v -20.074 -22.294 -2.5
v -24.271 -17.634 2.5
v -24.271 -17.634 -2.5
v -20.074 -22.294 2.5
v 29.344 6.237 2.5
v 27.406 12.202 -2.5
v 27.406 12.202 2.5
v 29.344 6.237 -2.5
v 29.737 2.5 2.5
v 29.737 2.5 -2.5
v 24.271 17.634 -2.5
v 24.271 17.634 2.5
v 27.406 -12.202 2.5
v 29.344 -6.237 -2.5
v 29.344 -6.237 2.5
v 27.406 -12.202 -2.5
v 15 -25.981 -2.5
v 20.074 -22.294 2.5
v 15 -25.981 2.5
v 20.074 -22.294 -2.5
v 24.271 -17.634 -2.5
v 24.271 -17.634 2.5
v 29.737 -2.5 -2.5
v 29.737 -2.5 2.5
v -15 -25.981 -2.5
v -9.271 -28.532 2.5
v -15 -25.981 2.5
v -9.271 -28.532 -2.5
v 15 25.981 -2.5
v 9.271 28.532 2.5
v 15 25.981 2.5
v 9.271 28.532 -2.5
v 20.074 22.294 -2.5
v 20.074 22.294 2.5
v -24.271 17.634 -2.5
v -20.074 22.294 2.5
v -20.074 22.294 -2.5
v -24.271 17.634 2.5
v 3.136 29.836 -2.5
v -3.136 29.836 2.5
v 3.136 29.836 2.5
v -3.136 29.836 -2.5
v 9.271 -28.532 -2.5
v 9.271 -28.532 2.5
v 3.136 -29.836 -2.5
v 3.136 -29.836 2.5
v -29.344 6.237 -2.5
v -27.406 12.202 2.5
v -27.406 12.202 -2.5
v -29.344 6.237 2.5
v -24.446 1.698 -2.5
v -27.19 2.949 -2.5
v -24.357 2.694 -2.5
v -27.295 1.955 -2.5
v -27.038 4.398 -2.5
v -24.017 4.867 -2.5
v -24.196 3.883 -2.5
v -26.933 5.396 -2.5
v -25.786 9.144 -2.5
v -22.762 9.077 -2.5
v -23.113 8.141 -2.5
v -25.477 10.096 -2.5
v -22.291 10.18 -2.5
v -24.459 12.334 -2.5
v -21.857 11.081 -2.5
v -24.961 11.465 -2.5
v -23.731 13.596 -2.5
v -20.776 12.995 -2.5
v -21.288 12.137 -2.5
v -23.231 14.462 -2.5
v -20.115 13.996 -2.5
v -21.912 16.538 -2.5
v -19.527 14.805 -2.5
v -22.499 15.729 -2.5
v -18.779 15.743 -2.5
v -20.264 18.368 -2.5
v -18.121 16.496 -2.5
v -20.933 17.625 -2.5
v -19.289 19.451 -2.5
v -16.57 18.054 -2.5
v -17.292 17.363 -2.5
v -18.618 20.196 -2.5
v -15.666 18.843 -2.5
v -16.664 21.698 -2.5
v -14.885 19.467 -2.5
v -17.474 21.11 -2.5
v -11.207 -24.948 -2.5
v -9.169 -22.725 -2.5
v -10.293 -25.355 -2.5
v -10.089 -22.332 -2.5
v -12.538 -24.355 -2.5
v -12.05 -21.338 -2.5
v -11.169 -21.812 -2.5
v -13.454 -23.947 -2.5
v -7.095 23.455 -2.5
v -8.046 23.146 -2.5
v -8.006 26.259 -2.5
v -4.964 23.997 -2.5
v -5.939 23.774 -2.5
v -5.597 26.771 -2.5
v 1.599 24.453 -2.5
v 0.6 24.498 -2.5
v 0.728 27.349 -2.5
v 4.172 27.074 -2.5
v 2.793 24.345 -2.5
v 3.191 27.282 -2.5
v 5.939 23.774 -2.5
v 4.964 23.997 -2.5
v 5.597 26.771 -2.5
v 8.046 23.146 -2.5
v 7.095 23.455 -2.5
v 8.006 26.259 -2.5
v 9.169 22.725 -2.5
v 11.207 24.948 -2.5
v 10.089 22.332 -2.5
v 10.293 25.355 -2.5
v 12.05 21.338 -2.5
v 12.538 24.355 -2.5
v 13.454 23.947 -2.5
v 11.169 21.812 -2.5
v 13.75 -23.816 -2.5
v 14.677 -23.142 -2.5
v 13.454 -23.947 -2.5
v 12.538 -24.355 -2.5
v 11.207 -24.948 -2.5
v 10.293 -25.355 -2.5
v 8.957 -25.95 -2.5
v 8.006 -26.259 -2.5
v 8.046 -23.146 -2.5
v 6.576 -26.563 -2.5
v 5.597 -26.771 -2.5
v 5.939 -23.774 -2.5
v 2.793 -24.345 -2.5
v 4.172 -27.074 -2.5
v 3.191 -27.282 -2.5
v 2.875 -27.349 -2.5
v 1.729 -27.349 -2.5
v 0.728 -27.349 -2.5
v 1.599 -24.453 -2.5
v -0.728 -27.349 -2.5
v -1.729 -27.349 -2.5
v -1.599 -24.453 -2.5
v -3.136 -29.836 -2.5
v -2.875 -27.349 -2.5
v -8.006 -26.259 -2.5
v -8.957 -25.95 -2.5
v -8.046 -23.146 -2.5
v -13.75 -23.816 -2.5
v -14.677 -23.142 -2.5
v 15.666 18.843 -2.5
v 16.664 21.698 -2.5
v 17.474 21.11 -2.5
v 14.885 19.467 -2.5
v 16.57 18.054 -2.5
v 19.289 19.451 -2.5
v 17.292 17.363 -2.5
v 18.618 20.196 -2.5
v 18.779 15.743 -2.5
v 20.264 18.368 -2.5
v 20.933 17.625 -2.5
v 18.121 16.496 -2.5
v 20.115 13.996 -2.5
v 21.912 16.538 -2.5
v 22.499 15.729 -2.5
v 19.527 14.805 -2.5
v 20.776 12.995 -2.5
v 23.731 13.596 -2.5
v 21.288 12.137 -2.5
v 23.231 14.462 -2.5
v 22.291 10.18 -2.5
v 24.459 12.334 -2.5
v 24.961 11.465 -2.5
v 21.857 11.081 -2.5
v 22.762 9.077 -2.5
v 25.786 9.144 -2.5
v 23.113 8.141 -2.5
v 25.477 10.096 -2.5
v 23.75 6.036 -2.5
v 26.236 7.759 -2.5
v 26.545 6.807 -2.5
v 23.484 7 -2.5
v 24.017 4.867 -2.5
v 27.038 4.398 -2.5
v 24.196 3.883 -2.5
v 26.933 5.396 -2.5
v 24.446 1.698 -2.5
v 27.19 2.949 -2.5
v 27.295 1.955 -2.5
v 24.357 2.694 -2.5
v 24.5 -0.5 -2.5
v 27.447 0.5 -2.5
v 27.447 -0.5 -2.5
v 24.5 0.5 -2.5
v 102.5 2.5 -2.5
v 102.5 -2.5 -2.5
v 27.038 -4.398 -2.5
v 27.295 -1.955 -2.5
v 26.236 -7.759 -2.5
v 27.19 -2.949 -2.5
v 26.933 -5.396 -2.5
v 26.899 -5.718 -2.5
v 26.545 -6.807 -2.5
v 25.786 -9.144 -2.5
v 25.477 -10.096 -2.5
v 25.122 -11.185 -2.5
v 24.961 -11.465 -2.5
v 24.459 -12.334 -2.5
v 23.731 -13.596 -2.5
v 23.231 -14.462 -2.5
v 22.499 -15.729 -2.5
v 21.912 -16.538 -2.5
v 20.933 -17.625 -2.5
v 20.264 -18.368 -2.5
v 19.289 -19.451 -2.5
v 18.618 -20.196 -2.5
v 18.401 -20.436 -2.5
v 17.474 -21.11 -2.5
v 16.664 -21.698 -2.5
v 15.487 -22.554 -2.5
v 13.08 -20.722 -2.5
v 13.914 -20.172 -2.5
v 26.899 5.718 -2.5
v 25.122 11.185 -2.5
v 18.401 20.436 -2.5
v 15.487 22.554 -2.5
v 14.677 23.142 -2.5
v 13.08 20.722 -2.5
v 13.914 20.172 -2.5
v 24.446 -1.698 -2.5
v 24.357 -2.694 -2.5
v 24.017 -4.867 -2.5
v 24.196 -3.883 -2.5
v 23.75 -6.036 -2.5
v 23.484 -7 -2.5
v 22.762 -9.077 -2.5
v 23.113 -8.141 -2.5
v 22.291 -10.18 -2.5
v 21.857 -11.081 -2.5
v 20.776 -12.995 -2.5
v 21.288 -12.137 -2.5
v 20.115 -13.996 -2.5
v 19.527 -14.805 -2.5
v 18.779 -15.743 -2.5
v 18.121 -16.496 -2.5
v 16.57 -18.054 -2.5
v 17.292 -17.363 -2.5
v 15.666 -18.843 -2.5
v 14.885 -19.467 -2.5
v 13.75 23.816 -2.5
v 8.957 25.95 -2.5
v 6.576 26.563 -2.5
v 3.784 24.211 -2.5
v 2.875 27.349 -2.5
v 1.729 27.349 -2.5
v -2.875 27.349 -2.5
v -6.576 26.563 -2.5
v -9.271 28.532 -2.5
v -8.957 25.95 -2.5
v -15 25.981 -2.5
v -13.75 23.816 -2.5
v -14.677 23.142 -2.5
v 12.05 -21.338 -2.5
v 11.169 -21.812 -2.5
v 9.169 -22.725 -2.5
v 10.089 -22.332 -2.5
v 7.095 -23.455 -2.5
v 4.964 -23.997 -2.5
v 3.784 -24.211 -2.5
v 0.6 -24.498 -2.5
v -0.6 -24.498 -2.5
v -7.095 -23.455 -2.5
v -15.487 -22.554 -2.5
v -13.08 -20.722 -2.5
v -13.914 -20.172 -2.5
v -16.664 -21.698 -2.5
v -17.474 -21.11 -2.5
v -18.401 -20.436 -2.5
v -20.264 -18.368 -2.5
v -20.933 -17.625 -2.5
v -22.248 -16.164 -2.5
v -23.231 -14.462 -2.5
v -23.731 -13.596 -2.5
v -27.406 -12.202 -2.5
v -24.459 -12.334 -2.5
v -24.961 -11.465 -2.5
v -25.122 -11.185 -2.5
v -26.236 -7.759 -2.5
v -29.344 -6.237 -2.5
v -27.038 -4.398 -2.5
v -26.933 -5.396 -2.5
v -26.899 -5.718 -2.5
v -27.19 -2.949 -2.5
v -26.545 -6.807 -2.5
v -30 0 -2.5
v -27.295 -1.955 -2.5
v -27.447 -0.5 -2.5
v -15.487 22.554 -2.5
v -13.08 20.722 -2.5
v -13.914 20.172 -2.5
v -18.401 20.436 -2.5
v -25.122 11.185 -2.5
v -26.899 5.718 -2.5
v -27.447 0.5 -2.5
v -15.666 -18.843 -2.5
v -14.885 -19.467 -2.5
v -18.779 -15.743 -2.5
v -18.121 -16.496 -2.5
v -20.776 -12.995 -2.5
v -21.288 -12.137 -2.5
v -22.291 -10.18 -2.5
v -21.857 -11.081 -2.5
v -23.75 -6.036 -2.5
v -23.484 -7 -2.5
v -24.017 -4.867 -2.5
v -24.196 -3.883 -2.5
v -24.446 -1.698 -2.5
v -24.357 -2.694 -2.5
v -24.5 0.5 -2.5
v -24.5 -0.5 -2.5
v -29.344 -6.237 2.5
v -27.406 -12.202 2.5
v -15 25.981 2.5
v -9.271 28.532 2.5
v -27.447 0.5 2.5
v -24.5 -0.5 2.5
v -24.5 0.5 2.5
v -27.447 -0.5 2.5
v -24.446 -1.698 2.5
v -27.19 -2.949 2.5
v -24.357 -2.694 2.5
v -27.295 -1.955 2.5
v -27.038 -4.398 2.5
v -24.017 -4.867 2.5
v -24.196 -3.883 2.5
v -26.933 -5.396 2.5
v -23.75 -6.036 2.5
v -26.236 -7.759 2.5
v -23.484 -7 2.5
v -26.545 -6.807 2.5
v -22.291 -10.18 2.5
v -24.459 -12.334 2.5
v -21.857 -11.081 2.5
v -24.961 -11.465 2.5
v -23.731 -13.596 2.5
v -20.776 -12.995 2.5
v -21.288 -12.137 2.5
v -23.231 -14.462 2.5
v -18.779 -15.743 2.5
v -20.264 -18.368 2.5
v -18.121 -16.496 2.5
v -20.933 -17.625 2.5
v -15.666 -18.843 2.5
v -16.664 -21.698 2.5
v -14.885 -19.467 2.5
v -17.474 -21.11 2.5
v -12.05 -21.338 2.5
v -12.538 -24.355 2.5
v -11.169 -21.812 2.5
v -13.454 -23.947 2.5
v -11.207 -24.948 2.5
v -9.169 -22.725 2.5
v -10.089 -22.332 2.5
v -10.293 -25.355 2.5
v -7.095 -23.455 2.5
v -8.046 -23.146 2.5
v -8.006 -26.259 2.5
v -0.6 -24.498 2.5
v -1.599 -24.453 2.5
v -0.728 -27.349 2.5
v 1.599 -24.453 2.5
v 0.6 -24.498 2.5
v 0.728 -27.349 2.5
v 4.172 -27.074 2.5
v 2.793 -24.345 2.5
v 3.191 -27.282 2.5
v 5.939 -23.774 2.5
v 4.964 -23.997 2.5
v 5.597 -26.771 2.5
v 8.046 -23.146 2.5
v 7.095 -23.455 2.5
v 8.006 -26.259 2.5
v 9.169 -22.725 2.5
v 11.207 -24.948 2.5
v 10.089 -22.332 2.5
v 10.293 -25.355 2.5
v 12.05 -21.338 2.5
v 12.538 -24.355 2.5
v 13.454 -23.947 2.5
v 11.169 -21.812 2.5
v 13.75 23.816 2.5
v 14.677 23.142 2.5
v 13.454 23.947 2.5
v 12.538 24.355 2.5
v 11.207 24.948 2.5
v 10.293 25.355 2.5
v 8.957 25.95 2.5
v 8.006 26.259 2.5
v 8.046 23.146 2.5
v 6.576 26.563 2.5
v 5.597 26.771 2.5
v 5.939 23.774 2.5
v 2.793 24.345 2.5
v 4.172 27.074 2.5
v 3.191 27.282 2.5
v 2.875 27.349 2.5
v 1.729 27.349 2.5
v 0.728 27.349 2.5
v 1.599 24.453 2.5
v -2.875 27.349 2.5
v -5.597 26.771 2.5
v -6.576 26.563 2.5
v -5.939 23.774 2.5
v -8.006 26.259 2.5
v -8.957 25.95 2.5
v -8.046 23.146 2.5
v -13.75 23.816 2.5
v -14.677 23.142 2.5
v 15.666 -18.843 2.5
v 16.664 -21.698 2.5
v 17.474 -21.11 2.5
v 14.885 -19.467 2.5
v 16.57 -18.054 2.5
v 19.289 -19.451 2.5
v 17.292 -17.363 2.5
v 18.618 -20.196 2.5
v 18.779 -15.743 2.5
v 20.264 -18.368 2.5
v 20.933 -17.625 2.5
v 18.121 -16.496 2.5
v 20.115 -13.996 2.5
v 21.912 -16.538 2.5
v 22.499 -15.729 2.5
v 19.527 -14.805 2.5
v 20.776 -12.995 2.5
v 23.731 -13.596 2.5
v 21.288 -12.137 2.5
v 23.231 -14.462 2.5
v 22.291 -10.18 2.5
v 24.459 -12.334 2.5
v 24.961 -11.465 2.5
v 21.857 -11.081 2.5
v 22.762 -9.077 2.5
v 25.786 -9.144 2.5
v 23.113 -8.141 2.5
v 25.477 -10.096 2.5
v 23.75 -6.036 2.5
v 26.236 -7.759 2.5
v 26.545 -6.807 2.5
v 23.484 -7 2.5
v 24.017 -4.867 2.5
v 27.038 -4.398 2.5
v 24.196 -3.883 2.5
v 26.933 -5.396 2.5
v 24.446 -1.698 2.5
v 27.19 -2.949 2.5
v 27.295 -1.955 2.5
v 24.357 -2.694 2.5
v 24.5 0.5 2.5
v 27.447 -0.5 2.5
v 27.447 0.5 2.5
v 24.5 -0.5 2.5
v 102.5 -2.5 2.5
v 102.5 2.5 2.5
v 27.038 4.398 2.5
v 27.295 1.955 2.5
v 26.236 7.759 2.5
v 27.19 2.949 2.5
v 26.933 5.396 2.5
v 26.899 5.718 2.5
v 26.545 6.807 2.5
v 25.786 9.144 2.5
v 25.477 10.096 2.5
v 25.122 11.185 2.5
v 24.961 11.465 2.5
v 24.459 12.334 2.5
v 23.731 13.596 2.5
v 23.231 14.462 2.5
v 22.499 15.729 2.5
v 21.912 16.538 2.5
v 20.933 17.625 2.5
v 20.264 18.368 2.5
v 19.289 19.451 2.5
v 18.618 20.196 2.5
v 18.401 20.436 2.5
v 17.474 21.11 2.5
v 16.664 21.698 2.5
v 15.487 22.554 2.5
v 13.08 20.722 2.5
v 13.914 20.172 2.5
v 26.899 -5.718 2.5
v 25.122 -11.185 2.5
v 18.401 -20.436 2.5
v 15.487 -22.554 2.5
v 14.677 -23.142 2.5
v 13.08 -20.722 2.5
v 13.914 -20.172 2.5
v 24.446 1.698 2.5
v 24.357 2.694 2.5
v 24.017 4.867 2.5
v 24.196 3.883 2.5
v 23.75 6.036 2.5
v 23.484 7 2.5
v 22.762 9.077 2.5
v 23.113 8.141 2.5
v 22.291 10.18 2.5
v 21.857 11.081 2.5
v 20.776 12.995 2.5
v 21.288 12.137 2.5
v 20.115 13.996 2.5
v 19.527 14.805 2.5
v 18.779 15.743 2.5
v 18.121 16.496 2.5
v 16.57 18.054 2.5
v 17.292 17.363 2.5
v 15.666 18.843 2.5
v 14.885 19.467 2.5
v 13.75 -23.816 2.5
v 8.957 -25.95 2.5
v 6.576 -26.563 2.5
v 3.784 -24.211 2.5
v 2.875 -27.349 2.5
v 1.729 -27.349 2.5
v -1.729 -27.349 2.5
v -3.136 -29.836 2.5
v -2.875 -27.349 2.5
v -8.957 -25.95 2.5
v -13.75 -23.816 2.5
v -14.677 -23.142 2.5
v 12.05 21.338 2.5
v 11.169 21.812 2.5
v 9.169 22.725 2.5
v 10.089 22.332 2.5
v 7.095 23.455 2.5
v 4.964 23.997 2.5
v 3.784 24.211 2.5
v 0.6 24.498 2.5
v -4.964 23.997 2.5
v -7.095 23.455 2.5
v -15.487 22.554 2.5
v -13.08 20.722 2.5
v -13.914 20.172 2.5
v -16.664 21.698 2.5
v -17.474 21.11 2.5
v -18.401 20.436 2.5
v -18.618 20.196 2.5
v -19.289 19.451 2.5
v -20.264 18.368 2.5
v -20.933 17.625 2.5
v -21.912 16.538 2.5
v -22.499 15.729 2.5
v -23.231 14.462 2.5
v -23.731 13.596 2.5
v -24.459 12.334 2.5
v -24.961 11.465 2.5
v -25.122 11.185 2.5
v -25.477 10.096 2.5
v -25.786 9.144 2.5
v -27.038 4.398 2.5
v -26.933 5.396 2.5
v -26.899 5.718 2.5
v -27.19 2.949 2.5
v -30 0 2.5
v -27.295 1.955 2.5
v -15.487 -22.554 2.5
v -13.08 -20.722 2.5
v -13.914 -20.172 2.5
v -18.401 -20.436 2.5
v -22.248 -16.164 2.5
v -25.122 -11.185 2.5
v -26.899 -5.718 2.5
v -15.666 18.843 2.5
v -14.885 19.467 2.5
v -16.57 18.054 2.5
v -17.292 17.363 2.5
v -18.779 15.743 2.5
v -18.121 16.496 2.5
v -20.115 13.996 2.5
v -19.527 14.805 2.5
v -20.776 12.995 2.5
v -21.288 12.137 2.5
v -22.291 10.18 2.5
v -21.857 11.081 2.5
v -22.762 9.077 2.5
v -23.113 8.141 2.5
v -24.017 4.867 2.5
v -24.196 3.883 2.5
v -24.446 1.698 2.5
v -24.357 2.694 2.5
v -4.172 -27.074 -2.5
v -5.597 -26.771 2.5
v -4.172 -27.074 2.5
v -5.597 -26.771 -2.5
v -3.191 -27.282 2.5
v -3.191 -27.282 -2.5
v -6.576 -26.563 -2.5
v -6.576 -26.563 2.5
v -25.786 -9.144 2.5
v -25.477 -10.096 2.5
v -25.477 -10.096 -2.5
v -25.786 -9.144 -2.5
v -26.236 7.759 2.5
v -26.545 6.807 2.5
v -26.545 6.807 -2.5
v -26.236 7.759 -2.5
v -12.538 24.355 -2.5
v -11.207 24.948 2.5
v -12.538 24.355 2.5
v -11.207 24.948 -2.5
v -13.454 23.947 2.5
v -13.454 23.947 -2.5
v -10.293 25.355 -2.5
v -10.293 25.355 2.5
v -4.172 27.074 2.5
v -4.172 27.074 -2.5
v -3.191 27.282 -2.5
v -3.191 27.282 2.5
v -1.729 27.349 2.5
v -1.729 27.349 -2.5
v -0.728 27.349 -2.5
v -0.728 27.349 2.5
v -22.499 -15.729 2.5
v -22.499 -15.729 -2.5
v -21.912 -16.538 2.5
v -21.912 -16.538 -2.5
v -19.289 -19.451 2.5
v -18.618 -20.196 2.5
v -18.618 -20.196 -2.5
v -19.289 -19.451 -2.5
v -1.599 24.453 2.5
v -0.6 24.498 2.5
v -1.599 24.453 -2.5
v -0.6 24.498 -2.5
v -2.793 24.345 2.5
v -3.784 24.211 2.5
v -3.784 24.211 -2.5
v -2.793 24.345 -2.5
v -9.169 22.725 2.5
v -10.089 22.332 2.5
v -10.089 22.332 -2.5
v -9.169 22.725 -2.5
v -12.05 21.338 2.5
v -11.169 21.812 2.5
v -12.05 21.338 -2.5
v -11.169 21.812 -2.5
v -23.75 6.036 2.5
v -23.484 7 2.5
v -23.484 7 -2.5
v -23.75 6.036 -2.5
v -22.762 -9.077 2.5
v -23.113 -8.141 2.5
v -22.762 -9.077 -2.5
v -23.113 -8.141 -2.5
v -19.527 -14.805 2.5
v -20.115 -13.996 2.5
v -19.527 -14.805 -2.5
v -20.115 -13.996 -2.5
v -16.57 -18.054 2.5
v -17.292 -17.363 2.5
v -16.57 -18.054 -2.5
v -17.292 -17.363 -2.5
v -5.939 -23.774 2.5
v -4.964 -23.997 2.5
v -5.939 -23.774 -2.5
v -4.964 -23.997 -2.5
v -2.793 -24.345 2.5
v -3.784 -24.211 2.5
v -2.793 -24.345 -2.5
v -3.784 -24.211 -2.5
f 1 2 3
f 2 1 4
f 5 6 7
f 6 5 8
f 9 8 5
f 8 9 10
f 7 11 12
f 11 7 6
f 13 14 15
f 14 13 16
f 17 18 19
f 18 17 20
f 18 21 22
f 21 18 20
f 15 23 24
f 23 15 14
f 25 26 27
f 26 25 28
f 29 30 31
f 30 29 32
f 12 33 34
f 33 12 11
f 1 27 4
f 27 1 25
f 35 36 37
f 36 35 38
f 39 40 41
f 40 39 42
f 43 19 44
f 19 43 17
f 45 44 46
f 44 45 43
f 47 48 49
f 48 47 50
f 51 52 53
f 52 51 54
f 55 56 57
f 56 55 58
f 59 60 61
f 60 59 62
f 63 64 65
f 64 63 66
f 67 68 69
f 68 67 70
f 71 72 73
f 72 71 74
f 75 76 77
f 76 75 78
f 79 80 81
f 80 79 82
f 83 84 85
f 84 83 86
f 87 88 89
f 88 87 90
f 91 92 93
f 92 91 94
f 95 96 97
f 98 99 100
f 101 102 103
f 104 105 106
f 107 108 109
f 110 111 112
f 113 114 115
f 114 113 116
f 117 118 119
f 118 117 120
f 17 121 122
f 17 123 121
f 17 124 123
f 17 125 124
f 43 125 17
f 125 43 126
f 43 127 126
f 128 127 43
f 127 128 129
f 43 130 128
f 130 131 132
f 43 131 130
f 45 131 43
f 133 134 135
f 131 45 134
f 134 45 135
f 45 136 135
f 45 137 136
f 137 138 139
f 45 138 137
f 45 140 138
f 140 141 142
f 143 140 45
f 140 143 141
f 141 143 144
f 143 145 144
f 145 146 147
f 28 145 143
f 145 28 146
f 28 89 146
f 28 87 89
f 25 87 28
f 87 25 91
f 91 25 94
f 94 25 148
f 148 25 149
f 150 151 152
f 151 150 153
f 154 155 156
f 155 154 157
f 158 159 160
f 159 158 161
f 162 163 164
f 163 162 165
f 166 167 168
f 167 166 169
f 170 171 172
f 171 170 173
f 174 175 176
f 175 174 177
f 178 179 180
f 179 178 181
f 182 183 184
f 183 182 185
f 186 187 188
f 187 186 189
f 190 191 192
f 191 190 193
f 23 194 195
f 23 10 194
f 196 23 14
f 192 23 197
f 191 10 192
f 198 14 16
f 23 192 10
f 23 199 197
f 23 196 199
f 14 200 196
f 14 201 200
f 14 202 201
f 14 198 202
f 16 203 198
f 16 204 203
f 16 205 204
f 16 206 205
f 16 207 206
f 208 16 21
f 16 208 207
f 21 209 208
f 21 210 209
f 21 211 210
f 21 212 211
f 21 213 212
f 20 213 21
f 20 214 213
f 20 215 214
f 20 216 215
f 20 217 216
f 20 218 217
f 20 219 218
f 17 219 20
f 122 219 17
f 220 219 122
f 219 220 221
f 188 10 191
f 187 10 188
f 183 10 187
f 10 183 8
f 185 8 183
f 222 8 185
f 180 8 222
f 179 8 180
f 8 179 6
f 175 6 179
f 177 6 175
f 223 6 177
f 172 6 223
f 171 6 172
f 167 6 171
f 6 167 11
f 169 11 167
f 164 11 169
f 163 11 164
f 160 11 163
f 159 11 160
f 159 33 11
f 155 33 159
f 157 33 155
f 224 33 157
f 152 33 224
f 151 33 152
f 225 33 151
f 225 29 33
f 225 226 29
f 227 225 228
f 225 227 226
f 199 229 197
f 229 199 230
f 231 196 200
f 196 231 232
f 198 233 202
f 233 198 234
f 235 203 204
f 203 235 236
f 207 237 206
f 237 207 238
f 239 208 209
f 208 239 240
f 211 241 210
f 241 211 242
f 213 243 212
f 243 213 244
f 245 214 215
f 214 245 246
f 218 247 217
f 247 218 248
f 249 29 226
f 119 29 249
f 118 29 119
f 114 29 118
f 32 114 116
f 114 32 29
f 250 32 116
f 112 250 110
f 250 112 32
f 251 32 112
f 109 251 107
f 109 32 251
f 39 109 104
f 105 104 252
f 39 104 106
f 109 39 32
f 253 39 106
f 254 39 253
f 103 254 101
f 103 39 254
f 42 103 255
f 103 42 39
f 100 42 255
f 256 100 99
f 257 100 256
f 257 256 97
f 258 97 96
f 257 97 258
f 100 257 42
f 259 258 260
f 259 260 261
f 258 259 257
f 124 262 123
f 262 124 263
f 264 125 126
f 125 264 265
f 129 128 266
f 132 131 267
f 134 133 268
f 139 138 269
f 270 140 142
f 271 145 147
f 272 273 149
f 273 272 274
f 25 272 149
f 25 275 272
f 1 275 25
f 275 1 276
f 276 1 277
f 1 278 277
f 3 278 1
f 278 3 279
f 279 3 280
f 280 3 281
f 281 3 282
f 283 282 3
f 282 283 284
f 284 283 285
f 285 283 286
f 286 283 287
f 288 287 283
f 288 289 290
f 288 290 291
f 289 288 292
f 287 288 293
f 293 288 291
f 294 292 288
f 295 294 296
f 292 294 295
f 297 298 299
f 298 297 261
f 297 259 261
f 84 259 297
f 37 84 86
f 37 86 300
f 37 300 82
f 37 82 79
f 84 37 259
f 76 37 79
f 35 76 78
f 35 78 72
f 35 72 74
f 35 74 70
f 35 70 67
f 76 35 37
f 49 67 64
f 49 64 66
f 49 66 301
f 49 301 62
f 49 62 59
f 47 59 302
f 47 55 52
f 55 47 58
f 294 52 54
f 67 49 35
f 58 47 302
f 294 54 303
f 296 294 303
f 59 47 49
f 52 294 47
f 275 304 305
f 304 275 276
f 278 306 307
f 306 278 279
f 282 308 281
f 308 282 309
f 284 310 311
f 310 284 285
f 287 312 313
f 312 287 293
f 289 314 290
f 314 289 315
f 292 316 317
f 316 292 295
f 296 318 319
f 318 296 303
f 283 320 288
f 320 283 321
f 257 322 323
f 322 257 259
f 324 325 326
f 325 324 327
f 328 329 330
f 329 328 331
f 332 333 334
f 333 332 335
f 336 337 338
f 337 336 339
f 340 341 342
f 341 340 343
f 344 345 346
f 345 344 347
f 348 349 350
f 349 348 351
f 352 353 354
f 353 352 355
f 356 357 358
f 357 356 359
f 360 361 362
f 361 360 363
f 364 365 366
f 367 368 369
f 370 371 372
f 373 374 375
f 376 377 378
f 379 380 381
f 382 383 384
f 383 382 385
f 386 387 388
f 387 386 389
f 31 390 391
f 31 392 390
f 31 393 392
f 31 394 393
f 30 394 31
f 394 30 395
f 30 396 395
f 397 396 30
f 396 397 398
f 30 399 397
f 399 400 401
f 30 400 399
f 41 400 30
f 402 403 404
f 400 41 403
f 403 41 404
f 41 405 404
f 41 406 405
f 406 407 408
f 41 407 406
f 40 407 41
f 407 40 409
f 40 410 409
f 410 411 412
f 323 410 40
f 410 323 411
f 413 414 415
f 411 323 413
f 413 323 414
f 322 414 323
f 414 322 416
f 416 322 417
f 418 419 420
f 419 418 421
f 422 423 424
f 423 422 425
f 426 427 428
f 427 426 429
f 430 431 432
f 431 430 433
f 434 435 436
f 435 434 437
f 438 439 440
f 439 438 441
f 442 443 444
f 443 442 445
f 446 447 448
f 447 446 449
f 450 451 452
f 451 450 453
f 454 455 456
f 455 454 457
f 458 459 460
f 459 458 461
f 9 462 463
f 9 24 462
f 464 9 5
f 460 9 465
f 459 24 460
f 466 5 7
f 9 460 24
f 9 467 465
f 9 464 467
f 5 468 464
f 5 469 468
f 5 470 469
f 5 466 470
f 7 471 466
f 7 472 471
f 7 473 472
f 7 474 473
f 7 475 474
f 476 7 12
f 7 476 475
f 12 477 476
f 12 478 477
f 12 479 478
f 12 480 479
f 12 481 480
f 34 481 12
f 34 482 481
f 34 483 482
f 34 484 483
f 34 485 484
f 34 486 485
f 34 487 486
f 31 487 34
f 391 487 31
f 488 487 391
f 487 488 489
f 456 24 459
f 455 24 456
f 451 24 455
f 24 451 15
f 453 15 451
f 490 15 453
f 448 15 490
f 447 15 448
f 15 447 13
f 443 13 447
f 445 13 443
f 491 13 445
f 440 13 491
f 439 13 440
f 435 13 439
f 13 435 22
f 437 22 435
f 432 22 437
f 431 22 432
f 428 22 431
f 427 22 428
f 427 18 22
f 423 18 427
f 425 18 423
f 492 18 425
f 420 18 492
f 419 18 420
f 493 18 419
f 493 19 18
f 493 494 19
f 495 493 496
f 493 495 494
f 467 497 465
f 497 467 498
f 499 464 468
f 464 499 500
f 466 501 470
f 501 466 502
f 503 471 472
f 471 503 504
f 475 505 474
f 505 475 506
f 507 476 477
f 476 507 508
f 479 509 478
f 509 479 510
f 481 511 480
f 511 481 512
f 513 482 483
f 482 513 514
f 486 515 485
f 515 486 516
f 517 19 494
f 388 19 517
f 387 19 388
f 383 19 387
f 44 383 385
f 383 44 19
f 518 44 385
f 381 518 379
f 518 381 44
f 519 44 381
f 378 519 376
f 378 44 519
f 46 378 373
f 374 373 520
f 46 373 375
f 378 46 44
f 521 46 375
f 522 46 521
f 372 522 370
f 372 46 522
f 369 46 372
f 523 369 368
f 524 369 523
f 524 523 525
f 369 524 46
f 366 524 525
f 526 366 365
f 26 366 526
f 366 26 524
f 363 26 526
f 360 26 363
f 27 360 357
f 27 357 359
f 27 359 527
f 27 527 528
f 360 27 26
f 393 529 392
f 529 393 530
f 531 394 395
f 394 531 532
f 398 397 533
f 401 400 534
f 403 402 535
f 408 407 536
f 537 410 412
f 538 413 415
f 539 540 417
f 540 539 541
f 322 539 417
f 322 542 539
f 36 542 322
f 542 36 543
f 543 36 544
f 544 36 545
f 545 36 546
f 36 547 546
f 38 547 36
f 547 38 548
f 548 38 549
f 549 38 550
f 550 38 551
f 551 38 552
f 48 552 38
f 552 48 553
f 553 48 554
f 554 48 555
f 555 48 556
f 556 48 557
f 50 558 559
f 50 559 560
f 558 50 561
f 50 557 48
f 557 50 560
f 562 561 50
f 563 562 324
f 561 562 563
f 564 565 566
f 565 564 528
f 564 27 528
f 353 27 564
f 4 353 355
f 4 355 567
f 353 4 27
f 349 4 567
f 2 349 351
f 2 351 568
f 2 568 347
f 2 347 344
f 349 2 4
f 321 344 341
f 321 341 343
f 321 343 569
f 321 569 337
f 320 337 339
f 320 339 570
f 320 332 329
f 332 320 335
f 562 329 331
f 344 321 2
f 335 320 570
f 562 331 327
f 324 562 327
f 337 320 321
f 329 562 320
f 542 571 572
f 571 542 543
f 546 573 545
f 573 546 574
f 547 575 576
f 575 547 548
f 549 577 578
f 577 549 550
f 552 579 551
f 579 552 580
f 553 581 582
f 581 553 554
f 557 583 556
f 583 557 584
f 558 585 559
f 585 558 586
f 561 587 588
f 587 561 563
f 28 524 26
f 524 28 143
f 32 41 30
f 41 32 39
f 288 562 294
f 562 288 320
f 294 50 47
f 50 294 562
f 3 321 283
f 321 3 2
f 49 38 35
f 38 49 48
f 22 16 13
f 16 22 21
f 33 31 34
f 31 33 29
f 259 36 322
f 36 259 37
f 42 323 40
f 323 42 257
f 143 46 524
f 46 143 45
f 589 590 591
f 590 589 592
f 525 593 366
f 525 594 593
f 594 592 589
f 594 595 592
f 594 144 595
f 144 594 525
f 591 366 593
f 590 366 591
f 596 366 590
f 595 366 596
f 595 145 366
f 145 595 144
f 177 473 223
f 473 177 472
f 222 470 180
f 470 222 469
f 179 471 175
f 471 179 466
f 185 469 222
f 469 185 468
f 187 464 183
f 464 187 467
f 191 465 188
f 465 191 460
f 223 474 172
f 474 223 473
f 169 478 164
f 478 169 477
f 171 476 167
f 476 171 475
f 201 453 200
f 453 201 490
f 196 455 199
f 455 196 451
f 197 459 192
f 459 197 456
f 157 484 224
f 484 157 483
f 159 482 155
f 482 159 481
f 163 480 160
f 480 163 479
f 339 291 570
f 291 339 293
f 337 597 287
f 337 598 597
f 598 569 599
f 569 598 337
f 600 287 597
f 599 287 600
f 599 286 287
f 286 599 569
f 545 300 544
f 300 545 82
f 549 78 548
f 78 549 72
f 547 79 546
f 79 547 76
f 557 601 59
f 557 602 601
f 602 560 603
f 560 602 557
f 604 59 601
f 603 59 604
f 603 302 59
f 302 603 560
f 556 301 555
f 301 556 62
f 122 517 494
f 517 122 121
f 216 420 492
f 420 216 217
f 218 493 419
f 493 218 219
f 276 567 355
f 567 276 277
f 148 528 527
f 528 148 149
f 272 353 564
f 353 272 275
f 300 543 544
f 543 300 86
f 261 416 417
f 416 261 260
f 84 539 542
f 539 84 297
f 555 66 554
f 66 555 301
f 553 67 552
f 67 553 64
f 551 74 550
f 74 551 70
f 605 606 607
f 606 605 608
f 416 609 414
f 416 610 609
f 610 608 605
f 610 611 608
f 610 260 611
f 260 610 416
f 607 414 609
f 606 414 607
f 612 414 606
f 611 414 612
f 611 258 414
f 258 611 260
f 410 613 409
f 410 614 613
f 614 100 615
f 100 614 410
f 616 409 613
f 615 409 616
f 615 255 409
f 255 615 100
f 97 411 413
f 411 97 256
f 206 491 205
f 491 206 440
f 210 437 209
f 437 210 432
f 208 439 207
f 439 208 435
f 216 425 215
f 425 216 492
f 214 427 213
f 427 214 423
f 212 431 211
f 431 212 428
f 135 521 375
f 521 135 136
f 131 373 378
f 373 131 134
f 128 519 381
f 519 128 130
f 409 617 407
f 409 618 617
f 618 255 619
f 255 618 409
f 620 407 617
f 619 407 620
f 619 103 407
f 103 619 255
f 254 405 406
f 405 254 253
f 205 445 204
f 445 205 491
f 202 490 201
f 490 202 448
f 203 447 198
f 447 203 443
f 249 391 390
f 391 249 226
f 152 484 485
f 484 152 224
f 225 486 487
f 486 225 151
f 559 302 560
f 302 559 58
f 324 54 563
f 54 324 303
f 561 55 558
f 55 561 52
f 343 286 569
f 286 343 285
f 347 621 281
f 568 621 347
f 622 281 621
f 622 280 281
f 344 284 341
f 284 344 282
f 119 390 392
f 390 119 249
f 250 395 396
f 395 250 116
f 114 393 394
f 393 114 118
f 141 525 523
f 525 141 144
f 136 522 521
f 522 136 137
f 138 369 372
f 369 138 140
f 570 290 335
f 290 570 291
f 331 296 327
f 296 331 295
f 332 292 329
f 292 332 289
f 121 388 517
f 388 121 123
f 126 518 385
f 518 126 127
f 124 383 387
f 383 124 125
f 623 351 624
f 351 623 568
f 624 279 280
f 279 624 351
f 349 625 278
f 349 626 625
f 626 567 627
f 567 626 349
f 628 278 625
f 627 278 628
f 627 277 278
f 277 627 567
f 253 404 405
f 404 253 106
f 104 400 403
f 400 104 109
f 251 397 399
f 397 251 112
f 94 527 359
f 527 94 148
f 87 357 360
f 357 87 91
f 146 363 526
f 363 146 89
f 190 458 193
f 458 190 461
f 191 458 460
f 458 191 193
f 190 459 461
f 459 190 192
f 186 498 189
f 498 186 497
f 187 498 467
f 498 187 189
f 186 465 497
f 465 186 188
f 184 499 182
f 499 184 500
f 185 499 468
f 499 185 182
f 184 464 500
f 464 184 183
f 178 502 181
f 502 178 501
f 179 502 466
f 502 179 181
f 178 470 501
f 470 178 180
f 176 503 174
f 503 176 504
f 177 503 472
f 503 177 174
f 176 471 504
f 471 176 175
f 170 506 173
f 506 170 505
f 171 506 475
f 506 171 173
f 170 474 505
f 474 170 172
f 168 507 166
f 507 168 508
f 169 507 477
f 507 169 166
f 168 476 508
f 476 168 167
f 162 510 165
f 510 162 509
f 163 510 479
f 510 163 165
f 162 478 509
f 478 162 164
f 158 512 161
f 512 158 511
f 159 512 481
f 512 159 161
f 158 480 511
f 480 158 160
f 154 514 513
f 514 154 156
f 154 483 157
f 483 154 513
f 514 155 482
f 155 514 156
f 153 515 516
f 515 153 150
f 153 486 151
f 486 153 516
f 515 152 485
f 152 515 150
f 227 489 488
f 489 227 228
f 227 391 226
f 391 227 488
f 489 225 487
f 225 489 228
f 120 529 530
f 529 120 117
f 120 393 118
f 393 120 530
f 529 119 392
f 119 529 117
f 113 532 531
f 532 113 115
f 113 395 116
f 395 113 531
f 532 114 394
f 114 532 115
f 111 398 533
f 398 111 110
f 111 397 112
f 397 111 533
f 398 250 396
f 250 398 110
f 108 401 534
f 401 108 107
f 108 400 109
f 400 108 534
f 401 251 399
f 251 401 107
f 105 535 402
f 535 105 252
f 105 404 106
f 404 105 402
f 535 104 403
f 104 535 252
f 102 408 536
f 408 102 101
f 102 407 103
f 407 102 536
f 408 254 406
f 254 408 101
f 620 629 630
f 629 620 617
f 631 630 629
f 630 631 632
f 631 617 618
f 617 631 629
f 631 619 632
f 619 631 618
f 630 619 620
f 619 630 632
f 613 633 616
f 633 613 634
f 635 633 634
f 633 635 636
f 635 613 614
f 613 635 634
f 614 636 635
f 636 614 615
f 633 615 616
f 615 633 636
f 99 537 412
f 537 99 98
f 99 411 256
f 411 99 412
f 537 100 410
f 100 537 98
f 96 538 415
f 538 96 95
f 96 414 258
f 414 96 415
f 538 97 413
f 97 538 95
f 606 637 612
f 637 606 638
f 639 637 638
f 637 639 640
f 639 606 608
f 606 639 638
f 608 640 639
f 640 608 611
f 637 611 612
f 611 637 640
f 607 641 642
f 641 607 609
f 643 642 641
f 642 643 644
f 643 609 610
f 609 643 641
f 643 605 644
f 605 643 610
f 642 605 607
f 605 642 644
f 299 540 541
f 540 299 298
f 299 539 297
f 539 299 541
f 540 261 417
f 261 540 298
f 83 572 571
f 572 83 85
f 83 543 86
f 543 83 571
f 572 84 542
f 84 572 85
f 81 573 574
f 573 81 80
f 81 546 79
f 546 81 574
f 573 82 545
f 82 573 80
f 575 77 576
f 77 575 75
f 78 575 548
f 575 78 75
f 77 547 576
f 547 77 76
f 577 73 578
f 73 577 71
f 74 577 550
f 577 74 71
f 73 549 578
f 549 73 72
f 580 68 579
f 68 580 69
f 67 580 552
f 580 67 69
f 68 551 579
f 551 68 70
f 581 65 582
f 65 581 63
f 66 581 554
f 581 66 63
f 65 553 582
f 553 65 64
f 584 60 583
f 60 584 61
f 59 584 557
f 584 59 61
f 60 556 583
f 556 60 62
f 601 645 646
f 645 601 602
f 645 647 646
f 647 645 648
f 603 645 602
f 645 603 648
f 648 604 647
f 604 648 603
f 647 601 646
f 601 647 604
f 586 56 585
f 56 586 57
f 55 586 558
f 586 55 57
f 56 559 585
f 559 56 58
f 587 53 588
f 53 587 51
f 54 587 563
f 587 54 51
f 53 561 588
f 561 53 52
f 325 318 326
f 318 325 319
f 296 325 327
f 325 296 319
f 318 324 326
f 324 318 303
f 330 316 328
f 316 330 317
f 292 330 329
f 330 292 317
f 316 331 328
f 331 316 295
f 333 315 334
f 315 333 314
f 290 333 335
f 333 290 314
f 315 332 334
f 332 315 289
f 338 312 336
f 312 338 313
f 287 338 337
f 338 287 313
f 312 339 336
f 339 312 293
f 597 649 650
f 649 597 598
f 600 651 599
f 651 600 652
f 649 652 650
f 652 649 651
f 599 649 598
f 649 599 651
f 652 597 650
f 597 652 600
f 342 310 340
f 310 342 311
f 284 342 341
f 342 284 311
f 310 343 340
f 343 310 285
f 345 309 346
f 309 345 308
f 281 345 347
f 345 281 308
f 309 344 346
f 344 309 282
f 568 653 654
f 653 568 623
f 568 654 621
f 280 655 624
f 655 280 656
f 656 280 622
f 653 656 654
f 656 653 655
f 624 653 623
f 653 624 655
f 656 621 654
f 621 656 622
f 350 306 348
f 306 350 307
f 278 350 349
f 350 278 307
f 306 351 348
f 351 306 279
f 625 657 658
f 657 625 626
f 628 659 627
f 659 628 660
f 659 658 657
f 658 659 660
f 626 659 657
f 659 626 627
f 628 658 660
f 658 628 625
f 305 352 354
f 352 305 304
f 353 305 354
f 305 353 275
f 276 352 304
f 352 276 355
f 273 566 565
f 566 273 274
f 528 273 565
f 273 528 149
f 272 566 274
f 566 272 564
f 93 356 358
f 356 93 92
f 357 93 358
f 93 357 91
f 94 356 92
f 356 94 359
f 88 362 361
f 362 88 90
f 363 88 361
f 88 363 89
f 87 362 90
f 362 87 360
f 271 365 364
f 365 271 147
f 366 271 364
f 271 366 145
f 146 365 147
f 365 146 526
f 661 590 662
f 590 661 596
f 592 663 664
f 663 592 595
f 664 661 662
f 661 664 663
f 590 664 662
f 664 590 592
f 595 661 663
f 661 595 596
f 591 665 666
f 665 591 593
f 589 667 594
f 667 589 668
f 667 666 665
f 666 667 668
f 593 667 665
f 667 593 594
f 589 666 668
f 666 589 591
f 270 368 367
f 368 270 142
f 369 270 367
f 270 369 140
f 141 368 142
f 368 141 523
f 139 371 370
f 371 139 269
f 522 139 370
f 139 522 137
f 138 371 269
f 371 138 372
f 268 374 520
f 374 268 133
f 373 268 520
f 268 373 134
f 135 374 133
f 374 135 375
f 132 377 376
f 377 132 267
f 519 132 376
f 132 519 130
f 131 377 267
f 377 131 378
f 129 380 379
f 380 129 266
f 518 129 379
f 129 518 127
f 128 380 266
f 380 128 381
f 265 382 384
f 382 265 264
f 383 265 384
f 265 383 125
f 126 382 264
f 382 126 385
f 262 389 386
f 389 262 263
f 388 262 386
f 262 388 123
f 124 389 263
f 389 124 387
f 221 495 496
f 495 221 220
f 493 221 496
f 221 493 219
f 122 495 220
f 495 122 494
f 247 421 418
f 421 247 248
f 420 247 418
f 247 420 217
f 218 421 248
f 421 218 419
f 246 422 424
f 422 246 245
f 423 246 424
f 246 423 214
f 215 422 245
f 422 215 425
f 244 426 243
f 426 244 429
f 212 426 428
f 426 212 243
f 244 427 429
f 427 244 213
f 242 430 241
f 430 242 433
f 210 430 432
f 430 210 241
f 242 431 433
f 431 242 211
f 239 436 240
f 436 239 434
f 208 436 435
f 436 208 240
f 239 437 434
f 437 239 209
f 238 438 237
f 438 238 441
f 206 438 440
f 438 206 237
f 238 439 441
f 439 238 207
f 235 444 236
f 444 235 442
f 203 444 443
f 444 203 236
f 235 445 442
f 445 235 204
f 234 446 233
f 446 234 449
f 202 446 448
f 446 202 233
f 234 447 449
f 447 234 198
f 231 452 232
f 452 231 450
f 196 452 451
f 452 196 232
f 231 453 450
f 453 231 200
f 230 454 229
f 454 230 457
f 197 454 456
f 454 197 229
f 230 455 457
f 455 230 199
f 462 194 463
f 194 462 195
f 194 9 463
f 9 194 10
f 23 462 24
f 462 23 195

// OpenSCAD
  //Ring Diameter
  diameter=60;
  //Ring Height
  height=5;
  //Ring Thickness
  ring_thickness=5;
  
  //Notch Length
  notch_length=3;
  //Notch Thickness
  notch_thickness=1;
  //Notch Placement
  notch_placement=4;
  //Notch Height
  notch_height=0;
  //Notch Count
  notch_count=70;

  //Handle Length
  length=75;
  //Handle Thickness
  thickness=5;

union(){
  difference(){
    cylinder(d=diameter,h=height, center=true); 
    cylinder(d=diameter-ring_thickness,h=height*5, center=true);    
  }
  for(i = [0:notch_count]){
    rotate(360/notch_count*i){  
      translate([diameter/2-notch_placement,0,0]){
        cube([notch_length,notch_thickness,height+notch_height], center=true);
      }
    }
  }
  translate([(diameter/2)+(length/2)-(ring_thickness/2),0,0]){
    cube([length,thickness,thickness],center=true);
  }    
}





